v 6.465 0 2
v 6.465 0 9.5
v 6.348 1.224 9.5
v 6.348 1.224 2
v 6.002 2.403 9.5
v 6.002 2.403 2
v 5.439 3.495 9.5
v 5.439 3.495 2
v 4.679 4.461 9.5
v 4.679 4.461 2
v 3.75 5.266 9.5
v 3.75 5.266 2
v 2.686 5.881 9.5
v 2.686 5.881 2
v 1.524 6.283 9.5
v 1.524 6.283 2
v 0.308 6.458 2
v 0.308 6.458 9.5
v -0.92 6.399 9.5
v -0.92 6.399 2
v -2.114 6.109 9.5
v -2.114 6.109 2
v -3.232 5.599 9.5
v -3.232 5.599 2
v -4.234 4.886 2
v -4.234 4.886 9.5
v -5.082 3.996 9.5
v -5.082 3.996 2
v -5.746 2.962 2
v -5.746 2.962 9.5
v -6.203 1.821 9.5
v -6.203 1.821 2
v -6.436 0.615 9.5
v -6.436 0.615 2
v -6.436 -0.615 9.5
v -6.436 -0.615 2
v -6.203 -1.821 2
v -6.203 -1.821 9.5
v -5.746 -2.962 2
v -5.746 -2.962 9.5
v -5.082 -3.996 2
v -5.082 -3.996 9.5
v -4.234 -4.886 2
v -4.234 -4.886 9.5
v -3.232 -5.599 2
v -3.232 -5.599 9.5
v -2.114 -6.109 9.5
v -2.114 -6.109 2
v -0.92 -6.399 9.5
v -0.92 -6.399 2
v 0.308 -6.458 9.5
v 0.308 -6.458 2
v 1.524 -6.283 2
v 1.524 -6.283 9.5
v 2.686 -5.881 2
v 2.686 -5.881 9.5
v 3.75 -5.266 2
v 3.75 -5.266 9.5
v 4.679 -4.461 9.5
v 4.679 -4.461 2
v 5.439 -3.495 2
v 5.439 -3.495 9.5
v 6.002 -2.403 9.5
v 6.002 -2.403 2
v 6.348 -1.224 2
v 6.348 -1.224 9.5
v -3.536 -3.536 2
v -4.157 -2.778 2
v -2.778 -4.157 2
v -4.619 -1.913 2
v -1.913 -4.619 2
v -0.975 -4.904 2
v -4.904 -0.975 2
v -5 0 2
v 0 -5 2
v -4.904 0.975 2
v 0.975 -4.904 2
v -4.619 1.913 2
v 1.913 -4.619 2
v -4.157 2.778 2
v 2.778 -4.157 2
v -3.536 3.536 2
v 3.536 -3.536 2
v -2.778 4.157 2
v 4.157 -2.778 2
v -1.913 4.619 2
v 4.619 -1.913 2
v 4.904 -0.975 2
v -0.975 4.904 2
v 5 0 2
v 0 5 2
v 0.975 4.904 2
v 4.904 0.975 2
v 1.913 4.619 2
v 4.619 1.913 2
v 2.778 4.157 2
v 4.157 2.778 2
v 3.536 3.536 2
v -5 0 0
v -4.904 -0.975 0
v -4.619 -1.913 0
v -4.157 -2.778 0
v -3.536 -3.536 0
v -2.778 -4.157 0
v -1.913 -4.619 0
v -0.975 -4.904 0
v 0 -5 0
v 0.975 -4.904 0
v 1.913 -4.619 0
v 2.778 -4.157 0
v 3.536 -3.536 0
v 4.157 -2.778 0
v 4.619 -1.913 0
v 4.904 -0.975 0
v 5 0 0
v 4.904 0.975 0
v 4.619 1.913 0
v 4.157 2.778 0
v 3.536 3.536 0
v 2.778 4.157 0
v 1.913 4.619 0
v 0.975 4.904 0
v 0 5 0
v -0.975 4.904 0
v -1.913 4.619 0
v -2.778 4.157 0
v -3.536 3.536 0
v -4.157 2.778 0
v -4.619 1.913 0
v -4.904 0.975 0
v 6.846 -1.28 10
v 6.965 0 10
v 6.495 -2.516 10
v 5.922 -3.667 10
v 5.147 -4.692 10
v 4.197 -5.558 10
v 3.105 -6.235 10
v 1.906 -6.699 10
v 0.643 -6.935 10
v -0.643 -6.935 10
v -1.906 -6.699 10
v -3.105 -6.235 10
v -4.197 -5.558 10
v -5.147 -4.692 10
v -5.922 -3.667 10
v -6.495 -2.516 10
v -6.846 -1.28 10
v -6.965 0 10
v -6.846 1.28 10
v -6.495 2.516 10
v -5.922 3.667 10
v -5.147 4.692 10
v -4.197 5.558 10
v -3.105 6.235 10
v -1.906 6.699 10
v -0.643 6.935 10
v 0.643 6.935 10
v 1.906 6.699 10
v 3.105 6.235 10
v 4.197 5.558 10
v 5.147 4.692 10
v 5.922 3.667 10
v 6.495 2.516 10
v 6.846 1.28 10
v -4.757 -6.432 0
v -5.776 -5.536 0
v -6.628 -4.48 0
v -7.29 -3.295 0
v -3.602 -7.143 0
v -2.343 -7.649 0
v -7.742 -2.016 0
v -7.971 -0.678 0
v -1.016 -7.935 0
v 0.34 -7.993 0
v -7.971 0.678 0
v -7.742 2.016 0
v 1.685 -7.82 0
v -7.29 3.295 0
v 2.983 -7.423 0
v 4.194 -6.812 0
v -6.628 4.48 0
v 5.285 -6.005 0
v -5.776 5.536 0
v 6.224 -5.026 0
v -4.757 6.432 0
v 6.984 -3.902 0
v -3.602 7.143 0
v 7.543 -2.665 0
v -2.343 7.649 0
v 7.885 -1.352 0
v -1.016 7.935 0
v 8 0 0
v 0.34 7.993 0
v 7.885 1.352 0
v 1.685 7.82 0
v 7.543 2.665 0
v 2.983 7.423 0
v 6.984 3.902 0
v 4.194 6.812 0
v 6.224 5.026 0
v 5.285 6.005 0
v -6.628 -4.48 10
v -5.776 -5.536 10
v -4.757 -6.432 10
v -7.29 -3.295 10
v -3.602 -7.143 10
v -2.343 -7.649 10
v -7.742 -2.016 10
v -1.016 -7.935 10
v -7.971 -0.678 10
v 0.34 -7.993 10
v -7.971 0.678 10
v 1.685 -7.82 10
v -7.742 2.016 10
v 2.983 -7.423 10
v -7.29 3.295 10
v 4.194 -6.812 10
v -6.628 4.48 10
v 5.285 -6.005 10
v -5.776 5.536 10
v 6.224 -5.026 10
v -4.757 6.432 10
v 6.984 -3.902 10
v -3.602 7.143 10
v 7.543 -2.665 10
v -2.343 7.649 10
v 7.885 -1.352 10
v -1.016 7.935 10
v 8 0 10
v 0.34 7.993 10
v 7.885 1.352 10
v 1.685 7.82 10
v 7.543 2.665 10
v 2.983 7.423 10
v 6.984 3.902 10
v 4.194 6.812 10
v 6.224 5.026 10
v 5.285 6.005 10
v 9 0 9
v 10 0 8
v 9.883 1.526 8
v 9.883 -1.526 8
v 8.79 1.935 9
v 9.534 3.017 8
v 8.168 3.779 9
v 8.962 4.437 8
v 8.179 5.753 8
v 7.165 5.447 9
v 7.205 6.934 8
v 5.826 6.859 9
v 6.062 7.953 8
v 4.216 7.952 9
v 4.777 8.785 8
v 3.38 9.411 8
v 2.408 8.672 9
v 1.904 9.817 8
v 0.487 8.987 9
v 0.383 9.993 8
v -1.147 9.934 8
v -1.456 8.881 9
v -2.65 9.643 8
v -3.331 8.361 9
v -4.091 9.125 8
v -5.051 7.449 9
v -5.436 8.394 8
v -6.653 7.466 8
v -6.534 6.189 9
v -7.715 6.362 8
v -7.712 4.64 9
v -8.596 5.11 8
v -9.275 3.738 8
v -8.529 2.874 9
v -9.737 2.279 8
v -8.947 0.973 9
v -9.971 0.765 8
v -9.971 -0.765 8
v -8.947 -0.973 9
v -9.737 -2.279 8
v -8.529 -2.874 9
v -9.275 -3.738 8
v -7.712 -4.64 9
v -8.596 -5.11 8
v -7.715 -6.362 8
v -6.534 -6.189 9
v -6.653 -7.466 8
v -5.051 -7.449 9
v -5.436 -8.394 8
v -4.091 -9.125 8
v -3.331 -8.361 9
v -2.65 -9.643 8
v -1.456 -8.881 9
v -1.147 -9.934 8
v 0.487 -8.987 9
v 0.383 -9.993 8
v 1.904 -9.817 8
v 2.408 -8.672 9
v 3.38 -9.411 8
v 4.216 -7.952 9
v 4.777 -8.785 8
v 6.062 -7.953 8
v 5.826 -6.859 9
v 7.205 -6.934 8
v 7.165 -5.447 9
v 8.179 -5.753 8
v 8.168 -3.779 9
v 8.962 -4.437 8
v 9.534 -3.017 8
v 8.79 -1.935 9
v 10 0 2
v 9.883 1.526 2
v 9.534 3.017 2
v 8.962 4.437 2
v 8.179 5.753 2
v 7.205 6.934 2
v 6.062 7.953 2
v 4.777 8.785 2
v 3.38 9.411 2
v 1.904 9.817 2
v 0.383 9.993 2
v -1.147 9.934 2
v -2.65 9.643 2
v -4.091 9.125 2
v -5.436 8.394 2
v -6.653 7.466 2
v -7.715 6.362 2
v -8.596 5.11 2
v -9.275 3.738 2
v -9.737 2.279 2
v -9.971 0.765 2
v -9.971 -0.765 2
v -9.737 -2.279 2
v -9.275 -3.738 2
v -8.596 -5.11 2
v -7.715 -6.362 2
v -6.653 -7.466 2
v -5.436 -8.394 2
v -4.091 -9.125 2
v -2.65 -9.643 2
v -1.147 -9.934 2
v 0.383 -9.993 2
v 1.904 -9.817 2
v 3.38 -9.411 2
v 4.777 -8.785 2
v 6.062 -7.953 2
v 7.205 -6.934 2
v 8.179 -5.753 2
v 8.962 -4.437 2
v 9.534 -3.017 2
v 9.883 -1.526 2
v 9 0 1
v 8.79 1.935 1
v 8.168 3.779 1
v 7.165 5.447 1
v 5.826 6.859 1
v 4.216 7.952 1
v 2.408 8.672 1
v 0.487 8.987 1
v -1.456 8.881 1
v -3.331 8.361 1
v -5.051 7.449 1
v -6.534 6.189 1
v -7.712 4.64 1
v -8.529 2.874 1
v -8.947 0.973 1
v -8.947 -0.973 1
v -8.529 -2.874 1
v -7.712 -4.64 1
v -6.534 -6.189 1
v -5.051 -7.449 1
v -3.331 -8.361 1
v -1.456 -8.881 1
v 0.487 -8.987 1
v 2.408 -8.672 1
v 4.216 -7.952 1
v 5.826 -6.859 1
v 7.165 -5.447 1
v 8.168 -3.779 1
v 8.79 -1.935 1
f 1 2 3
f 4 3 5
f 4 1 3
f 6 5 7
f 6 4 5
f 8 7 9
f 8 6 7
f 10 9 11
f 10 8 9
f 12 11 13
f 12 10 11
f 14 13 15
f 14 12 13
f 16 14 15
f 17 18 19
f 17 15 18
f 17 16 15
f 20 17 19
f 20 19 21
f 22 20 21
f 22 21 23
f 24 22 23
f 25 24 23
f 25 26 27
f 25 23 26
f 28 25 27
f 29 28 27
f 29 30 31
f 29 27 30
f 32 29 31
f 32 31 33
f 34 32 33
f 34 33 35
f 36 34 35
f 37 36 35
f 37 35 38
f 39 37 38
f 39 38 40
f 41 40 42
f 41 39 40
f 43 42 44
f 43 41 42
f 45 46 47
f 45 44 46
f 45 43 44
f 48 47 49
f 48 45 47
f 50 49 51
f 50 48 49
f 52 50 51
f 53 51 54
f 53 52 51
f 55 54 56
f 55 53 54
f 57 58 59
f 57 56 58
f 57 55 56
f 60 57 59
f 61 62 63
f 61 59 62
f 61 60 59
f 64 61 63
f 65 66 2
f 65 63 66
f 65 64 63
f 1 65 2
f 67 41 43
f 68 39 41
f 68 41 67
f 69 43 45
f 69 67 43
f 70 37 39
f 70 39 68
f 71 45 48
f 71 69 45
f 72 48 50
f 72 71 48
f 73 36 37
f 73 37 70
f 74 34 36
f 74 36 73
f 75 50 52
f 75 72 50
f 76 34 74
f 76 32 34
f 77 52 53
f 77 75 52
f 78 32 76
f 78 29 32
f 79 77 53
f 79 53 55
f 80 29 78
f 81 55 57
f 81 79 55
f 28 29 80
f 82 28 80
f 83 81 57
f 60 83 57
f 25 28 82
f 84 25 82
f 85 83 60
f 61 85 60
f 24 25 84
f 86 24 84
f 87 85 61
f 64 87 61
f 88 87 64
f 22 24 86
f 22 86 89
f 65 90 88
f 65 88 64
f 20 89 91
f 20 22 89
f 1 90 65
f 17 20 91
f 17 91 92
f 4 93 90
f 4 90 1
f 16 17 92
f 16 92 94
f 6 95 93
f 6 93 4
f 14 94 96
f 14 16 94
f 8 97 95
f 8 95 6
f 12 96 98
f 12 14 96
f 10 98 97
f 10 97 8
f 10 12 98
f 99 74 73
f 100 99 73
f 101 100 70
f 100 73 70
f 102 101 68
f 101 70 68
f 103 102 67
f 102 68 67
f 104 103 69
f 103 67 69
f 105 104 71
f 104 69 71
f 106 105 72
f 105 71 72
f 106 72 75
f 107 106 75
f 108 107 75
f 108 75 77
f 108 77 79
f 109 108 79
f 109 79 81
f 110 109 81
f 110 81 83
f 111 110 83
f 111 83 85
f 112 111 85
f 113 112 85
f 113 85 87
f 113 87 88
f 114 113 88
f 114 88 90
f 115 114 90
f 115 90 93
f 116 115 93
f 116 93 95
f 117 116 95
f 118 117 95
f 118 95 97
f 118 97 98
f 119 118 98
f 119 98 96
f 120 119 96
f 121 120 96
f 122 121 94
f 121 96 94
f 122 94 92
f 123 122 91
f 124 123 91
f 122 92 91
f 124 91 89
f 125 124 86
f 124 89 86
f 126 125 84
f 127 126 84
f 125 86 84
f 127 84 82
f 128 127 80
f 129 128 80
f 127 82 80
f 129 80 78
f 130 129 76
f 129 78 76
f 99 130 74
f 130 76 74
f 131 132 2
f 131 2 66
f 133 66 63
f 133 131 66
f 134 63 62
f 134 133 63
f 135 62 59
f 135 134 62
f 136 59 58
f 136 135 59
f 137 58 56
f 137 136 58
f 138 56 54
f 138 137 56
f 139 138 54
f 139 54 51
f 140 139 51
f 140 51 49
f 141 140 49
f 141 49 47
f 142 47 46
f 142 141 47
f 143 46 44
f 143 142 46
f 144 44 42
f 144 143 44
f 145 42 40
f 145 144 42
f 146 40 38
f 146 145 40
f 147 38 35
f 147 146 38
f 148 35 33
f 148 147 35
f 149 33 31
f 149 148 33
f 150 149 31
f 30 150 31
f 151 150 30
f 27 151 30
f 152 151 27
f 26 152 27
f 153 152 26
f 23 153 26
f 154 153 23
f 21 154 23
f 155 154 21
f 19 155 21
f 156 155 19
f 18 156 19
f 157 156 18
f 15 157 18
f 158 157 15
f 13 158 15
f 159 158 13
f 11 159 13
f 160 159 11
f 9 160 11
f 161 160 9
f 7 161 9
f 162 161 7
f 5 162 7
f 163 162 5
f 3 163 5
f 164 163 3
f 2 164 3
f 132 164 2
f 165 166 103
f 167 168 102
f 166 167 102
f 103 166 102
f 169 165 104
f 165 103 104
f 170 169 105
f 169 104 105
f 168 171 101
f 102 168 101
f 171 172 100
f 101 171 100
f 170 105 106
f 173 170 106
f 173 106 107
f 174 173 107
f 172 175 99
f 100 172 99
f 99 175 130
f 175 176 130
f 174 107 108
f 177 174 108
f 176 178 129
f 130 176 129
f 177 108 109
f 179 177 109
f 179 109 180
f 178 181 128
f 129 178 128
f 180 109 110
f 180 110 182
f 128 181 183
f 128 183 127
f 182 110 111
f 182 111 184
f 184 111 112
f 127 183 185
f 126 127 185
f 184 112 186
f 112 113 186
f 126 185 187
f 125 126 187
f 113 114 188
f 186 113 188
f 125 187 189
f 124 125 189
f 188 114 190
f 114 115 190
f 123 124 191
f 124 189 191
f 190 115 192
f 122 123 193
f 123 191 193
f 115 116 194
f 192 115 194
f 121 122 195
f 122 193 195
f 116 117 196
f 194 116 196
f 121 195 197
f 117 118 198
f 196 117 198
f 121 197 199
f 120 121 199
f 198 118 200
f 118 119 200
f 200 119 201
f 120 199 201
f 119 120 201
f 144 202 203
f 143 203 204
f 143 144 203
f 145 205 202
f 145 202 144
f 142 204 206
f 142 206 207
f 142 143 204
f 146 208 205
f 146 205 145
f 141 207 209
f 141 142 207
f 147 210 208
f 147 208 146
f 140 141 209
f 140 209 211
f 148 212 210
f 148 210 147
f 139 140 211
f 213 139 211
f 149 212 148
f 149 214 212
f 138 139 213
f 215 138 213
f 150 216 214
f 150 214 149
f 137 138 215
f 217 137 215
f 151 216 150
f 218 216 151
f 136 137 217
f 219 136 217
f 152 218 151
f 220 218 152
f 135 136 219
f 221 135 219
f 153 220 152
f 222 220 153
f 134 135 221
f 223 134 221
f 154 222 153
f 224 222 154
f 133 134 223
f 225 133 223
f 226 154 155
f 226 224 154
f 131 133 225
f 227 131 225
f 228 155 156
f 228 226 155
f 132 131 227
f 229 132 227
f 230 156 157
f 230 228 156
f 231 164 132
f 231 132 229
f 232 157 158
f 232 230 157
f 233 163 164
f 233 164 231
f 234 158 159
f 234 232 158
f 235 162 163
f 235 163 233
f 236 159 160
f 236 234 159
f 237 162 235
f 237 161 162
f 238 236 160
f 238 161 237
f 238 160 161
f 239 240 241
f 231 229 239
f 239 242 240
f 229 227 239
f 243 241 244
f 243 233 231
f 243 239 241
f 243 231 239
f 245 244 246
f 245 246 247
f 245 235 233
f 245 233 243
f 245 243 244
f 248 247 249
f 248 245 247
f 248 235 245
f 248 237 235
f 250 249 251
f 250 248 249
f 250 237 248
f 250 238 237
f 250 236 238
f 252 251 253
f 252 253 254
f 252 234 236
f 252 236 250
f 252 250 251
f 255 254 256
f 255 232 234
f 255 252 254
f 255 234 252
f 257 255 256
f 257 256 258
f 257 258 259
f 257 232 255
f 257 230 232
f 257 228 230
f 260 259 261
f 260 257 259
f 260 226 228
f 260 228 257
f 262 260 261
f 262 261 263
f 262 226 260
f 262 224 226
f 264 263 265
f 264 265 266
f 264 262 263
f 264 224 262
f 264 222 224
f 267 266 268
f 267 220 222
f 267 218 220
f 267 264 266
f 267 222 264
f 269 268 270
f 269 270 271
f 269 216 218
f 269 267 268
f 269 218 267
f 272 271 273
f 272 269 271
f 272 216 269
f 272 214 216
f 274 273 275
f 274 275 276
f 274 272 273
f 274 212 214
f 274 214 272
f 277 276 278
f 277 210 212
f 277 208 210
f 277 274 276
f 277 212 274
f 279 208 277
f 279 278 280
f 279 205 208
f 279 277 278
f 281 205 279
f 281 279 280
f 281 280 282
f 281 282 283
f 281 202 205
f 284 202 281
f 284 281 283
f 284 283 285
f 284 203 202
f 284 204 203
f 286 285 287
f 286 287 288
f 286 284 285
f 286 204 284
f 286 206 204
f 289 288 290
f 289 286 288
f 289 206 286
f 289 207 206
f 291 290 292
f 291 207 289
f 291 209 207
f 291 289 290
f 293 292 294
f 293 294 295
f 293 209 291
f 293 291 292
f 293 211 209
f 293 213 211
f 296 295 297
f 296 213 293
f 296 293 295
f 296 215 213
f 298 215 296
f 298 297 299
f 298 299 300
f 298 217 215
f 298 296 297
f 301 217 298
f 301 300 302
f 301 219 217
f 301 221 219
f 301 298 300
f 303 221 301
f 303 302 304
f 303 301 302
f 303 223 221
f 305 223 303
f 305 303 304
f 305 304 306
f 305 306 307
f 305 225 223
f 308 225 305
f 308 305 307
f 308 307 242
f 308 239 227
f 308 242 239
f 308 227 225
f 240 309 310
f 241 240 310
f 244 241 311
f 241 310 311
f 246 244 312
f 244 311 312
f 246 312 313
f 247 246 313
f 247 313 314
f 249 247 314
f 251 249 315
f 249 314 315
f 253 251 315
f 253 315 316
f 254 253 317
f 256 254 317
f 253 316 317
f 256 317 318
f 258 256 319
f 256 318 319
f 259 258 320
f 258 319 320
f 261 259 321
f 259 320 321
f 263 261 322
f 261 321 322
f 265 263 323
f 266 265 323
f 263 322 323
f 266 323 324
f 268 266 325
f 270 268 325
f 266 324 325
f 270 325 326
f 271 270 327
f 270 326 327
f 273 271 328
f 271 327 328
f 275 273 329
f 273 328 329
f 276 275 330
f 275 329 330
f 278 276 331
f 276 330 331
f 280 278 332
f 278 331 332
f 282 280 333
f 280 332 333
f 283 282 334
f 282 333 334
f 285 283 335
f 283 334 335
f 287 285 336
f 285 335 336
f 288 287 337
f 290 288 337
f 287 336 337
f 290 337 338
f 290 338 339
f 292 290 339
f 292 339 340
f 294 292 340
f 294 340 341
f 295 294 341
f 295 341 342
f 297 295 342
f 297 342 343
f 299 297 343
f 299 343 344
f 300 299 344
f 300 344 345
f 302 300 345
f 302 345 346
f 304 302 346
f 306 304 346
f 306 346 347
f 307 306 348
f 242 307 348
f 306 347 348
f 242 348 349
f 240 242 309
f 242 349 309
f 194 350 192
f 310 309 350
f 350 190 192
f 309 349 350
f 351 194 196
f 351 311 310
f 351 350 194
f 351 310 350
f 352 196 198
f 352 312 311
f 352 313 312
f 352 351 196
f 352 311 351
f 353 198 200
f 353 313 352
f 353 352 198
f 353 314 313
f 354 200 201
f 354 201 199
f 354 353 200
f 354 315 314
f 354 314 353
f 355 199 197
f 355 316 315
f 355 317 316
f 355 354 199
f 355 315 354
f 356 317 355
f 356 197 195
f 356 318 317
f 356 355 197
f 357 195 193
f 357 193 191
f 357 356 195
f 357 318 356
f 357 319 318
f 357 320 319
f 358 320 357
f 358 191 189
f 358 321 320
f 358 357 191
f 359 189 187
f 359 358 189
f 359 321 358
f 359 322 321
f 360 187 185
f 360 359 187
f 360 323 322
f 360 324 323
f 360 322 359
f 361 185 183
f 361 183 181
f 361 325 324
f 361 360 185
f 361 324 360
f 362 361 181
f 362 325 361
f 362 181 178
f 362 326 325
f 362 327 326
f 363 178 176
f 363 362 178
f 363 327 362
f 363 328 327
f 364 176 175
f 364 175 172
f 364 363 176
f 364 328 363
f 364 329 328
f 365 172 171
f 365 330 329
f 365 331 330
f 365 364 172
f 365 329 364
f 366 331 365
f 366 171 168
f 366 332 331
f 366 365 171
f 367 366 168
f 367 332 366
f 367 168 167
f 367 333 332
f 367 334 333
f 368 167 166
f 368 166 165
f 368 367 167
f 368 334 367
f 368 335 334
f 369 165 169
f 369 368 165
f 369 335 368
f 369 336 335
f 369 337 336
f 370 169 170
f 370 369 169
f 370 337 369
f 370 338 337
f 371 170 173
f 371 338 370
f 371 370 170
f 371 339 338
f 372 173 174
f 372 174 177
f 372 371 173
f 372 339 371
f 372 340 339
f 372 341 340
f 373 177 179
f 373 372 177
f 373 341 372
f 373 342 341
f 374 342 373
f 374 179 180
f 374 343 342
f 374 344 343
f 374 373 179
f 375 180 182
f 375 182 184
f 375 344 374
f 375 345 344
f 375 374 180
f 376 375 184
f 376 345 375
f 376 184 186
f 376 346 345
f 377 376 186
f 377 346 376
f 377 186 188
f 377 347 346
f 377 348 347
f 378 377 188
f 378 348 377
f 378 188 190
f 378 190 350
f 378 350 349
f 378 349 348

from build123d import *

# Parameters (mm, degrees)
F0_R     = 10
F2_DEPTH = 10
F1_R     = 6.465
F3_DEPTH = 12
F4_R     = 6.465
F6_DEPTH = 2
F7_D     = 10
F8_SIZE2 = 2
F8_SIZE  = 2
F9_SIZE2 = 0.5
F9_SIZE  = 0.5


with BuildPart() as f2:
    # F0 (on Top) → F2 (new body)
    with BuildSketch(Plane.XY):
        Circle(F0_R)
    extrude(amount=F2_DEPTH)

    # F1 (on Top) → F3 (cut)
    with BuildSketch(Plane.XY):
        Circle(F1_R)
    extrude(amount=F3_DEPTH, mode=Mode.SUBTRACT)

    # F4 (on face) → F6 (join)
    with BuildSketch(Plane.XY):
        Circle(F4_R)
    extrude(amount=F6_DEPTH)

    # F7 (through all)
    with Locations(Plane(origin=(0, 0, 0), x_dir=(1, 0, 0), z_dir=(0, 0, -1))):
        with Locations((0, 0)):
            Hole(F7_D / 2)

    # F8
    f8_edges = [f2.edges().sort_by_distance(p)[0] for p in [
        (-10, 0, 10),
        (-10, 0, 0),
    ]]
    chamfer(f8_edges, length=F8_SIZE, length2=F8_SIZE2)

    # F9
    f9_edges = [f2.edges().sort_by_distance(p)[0] for p in [
        (-6.465, 0, 10),
    ]]
    chamfer(f9_edges, length=F9_SIZE, length2=F9_SIZE2)


solid = f2.part
